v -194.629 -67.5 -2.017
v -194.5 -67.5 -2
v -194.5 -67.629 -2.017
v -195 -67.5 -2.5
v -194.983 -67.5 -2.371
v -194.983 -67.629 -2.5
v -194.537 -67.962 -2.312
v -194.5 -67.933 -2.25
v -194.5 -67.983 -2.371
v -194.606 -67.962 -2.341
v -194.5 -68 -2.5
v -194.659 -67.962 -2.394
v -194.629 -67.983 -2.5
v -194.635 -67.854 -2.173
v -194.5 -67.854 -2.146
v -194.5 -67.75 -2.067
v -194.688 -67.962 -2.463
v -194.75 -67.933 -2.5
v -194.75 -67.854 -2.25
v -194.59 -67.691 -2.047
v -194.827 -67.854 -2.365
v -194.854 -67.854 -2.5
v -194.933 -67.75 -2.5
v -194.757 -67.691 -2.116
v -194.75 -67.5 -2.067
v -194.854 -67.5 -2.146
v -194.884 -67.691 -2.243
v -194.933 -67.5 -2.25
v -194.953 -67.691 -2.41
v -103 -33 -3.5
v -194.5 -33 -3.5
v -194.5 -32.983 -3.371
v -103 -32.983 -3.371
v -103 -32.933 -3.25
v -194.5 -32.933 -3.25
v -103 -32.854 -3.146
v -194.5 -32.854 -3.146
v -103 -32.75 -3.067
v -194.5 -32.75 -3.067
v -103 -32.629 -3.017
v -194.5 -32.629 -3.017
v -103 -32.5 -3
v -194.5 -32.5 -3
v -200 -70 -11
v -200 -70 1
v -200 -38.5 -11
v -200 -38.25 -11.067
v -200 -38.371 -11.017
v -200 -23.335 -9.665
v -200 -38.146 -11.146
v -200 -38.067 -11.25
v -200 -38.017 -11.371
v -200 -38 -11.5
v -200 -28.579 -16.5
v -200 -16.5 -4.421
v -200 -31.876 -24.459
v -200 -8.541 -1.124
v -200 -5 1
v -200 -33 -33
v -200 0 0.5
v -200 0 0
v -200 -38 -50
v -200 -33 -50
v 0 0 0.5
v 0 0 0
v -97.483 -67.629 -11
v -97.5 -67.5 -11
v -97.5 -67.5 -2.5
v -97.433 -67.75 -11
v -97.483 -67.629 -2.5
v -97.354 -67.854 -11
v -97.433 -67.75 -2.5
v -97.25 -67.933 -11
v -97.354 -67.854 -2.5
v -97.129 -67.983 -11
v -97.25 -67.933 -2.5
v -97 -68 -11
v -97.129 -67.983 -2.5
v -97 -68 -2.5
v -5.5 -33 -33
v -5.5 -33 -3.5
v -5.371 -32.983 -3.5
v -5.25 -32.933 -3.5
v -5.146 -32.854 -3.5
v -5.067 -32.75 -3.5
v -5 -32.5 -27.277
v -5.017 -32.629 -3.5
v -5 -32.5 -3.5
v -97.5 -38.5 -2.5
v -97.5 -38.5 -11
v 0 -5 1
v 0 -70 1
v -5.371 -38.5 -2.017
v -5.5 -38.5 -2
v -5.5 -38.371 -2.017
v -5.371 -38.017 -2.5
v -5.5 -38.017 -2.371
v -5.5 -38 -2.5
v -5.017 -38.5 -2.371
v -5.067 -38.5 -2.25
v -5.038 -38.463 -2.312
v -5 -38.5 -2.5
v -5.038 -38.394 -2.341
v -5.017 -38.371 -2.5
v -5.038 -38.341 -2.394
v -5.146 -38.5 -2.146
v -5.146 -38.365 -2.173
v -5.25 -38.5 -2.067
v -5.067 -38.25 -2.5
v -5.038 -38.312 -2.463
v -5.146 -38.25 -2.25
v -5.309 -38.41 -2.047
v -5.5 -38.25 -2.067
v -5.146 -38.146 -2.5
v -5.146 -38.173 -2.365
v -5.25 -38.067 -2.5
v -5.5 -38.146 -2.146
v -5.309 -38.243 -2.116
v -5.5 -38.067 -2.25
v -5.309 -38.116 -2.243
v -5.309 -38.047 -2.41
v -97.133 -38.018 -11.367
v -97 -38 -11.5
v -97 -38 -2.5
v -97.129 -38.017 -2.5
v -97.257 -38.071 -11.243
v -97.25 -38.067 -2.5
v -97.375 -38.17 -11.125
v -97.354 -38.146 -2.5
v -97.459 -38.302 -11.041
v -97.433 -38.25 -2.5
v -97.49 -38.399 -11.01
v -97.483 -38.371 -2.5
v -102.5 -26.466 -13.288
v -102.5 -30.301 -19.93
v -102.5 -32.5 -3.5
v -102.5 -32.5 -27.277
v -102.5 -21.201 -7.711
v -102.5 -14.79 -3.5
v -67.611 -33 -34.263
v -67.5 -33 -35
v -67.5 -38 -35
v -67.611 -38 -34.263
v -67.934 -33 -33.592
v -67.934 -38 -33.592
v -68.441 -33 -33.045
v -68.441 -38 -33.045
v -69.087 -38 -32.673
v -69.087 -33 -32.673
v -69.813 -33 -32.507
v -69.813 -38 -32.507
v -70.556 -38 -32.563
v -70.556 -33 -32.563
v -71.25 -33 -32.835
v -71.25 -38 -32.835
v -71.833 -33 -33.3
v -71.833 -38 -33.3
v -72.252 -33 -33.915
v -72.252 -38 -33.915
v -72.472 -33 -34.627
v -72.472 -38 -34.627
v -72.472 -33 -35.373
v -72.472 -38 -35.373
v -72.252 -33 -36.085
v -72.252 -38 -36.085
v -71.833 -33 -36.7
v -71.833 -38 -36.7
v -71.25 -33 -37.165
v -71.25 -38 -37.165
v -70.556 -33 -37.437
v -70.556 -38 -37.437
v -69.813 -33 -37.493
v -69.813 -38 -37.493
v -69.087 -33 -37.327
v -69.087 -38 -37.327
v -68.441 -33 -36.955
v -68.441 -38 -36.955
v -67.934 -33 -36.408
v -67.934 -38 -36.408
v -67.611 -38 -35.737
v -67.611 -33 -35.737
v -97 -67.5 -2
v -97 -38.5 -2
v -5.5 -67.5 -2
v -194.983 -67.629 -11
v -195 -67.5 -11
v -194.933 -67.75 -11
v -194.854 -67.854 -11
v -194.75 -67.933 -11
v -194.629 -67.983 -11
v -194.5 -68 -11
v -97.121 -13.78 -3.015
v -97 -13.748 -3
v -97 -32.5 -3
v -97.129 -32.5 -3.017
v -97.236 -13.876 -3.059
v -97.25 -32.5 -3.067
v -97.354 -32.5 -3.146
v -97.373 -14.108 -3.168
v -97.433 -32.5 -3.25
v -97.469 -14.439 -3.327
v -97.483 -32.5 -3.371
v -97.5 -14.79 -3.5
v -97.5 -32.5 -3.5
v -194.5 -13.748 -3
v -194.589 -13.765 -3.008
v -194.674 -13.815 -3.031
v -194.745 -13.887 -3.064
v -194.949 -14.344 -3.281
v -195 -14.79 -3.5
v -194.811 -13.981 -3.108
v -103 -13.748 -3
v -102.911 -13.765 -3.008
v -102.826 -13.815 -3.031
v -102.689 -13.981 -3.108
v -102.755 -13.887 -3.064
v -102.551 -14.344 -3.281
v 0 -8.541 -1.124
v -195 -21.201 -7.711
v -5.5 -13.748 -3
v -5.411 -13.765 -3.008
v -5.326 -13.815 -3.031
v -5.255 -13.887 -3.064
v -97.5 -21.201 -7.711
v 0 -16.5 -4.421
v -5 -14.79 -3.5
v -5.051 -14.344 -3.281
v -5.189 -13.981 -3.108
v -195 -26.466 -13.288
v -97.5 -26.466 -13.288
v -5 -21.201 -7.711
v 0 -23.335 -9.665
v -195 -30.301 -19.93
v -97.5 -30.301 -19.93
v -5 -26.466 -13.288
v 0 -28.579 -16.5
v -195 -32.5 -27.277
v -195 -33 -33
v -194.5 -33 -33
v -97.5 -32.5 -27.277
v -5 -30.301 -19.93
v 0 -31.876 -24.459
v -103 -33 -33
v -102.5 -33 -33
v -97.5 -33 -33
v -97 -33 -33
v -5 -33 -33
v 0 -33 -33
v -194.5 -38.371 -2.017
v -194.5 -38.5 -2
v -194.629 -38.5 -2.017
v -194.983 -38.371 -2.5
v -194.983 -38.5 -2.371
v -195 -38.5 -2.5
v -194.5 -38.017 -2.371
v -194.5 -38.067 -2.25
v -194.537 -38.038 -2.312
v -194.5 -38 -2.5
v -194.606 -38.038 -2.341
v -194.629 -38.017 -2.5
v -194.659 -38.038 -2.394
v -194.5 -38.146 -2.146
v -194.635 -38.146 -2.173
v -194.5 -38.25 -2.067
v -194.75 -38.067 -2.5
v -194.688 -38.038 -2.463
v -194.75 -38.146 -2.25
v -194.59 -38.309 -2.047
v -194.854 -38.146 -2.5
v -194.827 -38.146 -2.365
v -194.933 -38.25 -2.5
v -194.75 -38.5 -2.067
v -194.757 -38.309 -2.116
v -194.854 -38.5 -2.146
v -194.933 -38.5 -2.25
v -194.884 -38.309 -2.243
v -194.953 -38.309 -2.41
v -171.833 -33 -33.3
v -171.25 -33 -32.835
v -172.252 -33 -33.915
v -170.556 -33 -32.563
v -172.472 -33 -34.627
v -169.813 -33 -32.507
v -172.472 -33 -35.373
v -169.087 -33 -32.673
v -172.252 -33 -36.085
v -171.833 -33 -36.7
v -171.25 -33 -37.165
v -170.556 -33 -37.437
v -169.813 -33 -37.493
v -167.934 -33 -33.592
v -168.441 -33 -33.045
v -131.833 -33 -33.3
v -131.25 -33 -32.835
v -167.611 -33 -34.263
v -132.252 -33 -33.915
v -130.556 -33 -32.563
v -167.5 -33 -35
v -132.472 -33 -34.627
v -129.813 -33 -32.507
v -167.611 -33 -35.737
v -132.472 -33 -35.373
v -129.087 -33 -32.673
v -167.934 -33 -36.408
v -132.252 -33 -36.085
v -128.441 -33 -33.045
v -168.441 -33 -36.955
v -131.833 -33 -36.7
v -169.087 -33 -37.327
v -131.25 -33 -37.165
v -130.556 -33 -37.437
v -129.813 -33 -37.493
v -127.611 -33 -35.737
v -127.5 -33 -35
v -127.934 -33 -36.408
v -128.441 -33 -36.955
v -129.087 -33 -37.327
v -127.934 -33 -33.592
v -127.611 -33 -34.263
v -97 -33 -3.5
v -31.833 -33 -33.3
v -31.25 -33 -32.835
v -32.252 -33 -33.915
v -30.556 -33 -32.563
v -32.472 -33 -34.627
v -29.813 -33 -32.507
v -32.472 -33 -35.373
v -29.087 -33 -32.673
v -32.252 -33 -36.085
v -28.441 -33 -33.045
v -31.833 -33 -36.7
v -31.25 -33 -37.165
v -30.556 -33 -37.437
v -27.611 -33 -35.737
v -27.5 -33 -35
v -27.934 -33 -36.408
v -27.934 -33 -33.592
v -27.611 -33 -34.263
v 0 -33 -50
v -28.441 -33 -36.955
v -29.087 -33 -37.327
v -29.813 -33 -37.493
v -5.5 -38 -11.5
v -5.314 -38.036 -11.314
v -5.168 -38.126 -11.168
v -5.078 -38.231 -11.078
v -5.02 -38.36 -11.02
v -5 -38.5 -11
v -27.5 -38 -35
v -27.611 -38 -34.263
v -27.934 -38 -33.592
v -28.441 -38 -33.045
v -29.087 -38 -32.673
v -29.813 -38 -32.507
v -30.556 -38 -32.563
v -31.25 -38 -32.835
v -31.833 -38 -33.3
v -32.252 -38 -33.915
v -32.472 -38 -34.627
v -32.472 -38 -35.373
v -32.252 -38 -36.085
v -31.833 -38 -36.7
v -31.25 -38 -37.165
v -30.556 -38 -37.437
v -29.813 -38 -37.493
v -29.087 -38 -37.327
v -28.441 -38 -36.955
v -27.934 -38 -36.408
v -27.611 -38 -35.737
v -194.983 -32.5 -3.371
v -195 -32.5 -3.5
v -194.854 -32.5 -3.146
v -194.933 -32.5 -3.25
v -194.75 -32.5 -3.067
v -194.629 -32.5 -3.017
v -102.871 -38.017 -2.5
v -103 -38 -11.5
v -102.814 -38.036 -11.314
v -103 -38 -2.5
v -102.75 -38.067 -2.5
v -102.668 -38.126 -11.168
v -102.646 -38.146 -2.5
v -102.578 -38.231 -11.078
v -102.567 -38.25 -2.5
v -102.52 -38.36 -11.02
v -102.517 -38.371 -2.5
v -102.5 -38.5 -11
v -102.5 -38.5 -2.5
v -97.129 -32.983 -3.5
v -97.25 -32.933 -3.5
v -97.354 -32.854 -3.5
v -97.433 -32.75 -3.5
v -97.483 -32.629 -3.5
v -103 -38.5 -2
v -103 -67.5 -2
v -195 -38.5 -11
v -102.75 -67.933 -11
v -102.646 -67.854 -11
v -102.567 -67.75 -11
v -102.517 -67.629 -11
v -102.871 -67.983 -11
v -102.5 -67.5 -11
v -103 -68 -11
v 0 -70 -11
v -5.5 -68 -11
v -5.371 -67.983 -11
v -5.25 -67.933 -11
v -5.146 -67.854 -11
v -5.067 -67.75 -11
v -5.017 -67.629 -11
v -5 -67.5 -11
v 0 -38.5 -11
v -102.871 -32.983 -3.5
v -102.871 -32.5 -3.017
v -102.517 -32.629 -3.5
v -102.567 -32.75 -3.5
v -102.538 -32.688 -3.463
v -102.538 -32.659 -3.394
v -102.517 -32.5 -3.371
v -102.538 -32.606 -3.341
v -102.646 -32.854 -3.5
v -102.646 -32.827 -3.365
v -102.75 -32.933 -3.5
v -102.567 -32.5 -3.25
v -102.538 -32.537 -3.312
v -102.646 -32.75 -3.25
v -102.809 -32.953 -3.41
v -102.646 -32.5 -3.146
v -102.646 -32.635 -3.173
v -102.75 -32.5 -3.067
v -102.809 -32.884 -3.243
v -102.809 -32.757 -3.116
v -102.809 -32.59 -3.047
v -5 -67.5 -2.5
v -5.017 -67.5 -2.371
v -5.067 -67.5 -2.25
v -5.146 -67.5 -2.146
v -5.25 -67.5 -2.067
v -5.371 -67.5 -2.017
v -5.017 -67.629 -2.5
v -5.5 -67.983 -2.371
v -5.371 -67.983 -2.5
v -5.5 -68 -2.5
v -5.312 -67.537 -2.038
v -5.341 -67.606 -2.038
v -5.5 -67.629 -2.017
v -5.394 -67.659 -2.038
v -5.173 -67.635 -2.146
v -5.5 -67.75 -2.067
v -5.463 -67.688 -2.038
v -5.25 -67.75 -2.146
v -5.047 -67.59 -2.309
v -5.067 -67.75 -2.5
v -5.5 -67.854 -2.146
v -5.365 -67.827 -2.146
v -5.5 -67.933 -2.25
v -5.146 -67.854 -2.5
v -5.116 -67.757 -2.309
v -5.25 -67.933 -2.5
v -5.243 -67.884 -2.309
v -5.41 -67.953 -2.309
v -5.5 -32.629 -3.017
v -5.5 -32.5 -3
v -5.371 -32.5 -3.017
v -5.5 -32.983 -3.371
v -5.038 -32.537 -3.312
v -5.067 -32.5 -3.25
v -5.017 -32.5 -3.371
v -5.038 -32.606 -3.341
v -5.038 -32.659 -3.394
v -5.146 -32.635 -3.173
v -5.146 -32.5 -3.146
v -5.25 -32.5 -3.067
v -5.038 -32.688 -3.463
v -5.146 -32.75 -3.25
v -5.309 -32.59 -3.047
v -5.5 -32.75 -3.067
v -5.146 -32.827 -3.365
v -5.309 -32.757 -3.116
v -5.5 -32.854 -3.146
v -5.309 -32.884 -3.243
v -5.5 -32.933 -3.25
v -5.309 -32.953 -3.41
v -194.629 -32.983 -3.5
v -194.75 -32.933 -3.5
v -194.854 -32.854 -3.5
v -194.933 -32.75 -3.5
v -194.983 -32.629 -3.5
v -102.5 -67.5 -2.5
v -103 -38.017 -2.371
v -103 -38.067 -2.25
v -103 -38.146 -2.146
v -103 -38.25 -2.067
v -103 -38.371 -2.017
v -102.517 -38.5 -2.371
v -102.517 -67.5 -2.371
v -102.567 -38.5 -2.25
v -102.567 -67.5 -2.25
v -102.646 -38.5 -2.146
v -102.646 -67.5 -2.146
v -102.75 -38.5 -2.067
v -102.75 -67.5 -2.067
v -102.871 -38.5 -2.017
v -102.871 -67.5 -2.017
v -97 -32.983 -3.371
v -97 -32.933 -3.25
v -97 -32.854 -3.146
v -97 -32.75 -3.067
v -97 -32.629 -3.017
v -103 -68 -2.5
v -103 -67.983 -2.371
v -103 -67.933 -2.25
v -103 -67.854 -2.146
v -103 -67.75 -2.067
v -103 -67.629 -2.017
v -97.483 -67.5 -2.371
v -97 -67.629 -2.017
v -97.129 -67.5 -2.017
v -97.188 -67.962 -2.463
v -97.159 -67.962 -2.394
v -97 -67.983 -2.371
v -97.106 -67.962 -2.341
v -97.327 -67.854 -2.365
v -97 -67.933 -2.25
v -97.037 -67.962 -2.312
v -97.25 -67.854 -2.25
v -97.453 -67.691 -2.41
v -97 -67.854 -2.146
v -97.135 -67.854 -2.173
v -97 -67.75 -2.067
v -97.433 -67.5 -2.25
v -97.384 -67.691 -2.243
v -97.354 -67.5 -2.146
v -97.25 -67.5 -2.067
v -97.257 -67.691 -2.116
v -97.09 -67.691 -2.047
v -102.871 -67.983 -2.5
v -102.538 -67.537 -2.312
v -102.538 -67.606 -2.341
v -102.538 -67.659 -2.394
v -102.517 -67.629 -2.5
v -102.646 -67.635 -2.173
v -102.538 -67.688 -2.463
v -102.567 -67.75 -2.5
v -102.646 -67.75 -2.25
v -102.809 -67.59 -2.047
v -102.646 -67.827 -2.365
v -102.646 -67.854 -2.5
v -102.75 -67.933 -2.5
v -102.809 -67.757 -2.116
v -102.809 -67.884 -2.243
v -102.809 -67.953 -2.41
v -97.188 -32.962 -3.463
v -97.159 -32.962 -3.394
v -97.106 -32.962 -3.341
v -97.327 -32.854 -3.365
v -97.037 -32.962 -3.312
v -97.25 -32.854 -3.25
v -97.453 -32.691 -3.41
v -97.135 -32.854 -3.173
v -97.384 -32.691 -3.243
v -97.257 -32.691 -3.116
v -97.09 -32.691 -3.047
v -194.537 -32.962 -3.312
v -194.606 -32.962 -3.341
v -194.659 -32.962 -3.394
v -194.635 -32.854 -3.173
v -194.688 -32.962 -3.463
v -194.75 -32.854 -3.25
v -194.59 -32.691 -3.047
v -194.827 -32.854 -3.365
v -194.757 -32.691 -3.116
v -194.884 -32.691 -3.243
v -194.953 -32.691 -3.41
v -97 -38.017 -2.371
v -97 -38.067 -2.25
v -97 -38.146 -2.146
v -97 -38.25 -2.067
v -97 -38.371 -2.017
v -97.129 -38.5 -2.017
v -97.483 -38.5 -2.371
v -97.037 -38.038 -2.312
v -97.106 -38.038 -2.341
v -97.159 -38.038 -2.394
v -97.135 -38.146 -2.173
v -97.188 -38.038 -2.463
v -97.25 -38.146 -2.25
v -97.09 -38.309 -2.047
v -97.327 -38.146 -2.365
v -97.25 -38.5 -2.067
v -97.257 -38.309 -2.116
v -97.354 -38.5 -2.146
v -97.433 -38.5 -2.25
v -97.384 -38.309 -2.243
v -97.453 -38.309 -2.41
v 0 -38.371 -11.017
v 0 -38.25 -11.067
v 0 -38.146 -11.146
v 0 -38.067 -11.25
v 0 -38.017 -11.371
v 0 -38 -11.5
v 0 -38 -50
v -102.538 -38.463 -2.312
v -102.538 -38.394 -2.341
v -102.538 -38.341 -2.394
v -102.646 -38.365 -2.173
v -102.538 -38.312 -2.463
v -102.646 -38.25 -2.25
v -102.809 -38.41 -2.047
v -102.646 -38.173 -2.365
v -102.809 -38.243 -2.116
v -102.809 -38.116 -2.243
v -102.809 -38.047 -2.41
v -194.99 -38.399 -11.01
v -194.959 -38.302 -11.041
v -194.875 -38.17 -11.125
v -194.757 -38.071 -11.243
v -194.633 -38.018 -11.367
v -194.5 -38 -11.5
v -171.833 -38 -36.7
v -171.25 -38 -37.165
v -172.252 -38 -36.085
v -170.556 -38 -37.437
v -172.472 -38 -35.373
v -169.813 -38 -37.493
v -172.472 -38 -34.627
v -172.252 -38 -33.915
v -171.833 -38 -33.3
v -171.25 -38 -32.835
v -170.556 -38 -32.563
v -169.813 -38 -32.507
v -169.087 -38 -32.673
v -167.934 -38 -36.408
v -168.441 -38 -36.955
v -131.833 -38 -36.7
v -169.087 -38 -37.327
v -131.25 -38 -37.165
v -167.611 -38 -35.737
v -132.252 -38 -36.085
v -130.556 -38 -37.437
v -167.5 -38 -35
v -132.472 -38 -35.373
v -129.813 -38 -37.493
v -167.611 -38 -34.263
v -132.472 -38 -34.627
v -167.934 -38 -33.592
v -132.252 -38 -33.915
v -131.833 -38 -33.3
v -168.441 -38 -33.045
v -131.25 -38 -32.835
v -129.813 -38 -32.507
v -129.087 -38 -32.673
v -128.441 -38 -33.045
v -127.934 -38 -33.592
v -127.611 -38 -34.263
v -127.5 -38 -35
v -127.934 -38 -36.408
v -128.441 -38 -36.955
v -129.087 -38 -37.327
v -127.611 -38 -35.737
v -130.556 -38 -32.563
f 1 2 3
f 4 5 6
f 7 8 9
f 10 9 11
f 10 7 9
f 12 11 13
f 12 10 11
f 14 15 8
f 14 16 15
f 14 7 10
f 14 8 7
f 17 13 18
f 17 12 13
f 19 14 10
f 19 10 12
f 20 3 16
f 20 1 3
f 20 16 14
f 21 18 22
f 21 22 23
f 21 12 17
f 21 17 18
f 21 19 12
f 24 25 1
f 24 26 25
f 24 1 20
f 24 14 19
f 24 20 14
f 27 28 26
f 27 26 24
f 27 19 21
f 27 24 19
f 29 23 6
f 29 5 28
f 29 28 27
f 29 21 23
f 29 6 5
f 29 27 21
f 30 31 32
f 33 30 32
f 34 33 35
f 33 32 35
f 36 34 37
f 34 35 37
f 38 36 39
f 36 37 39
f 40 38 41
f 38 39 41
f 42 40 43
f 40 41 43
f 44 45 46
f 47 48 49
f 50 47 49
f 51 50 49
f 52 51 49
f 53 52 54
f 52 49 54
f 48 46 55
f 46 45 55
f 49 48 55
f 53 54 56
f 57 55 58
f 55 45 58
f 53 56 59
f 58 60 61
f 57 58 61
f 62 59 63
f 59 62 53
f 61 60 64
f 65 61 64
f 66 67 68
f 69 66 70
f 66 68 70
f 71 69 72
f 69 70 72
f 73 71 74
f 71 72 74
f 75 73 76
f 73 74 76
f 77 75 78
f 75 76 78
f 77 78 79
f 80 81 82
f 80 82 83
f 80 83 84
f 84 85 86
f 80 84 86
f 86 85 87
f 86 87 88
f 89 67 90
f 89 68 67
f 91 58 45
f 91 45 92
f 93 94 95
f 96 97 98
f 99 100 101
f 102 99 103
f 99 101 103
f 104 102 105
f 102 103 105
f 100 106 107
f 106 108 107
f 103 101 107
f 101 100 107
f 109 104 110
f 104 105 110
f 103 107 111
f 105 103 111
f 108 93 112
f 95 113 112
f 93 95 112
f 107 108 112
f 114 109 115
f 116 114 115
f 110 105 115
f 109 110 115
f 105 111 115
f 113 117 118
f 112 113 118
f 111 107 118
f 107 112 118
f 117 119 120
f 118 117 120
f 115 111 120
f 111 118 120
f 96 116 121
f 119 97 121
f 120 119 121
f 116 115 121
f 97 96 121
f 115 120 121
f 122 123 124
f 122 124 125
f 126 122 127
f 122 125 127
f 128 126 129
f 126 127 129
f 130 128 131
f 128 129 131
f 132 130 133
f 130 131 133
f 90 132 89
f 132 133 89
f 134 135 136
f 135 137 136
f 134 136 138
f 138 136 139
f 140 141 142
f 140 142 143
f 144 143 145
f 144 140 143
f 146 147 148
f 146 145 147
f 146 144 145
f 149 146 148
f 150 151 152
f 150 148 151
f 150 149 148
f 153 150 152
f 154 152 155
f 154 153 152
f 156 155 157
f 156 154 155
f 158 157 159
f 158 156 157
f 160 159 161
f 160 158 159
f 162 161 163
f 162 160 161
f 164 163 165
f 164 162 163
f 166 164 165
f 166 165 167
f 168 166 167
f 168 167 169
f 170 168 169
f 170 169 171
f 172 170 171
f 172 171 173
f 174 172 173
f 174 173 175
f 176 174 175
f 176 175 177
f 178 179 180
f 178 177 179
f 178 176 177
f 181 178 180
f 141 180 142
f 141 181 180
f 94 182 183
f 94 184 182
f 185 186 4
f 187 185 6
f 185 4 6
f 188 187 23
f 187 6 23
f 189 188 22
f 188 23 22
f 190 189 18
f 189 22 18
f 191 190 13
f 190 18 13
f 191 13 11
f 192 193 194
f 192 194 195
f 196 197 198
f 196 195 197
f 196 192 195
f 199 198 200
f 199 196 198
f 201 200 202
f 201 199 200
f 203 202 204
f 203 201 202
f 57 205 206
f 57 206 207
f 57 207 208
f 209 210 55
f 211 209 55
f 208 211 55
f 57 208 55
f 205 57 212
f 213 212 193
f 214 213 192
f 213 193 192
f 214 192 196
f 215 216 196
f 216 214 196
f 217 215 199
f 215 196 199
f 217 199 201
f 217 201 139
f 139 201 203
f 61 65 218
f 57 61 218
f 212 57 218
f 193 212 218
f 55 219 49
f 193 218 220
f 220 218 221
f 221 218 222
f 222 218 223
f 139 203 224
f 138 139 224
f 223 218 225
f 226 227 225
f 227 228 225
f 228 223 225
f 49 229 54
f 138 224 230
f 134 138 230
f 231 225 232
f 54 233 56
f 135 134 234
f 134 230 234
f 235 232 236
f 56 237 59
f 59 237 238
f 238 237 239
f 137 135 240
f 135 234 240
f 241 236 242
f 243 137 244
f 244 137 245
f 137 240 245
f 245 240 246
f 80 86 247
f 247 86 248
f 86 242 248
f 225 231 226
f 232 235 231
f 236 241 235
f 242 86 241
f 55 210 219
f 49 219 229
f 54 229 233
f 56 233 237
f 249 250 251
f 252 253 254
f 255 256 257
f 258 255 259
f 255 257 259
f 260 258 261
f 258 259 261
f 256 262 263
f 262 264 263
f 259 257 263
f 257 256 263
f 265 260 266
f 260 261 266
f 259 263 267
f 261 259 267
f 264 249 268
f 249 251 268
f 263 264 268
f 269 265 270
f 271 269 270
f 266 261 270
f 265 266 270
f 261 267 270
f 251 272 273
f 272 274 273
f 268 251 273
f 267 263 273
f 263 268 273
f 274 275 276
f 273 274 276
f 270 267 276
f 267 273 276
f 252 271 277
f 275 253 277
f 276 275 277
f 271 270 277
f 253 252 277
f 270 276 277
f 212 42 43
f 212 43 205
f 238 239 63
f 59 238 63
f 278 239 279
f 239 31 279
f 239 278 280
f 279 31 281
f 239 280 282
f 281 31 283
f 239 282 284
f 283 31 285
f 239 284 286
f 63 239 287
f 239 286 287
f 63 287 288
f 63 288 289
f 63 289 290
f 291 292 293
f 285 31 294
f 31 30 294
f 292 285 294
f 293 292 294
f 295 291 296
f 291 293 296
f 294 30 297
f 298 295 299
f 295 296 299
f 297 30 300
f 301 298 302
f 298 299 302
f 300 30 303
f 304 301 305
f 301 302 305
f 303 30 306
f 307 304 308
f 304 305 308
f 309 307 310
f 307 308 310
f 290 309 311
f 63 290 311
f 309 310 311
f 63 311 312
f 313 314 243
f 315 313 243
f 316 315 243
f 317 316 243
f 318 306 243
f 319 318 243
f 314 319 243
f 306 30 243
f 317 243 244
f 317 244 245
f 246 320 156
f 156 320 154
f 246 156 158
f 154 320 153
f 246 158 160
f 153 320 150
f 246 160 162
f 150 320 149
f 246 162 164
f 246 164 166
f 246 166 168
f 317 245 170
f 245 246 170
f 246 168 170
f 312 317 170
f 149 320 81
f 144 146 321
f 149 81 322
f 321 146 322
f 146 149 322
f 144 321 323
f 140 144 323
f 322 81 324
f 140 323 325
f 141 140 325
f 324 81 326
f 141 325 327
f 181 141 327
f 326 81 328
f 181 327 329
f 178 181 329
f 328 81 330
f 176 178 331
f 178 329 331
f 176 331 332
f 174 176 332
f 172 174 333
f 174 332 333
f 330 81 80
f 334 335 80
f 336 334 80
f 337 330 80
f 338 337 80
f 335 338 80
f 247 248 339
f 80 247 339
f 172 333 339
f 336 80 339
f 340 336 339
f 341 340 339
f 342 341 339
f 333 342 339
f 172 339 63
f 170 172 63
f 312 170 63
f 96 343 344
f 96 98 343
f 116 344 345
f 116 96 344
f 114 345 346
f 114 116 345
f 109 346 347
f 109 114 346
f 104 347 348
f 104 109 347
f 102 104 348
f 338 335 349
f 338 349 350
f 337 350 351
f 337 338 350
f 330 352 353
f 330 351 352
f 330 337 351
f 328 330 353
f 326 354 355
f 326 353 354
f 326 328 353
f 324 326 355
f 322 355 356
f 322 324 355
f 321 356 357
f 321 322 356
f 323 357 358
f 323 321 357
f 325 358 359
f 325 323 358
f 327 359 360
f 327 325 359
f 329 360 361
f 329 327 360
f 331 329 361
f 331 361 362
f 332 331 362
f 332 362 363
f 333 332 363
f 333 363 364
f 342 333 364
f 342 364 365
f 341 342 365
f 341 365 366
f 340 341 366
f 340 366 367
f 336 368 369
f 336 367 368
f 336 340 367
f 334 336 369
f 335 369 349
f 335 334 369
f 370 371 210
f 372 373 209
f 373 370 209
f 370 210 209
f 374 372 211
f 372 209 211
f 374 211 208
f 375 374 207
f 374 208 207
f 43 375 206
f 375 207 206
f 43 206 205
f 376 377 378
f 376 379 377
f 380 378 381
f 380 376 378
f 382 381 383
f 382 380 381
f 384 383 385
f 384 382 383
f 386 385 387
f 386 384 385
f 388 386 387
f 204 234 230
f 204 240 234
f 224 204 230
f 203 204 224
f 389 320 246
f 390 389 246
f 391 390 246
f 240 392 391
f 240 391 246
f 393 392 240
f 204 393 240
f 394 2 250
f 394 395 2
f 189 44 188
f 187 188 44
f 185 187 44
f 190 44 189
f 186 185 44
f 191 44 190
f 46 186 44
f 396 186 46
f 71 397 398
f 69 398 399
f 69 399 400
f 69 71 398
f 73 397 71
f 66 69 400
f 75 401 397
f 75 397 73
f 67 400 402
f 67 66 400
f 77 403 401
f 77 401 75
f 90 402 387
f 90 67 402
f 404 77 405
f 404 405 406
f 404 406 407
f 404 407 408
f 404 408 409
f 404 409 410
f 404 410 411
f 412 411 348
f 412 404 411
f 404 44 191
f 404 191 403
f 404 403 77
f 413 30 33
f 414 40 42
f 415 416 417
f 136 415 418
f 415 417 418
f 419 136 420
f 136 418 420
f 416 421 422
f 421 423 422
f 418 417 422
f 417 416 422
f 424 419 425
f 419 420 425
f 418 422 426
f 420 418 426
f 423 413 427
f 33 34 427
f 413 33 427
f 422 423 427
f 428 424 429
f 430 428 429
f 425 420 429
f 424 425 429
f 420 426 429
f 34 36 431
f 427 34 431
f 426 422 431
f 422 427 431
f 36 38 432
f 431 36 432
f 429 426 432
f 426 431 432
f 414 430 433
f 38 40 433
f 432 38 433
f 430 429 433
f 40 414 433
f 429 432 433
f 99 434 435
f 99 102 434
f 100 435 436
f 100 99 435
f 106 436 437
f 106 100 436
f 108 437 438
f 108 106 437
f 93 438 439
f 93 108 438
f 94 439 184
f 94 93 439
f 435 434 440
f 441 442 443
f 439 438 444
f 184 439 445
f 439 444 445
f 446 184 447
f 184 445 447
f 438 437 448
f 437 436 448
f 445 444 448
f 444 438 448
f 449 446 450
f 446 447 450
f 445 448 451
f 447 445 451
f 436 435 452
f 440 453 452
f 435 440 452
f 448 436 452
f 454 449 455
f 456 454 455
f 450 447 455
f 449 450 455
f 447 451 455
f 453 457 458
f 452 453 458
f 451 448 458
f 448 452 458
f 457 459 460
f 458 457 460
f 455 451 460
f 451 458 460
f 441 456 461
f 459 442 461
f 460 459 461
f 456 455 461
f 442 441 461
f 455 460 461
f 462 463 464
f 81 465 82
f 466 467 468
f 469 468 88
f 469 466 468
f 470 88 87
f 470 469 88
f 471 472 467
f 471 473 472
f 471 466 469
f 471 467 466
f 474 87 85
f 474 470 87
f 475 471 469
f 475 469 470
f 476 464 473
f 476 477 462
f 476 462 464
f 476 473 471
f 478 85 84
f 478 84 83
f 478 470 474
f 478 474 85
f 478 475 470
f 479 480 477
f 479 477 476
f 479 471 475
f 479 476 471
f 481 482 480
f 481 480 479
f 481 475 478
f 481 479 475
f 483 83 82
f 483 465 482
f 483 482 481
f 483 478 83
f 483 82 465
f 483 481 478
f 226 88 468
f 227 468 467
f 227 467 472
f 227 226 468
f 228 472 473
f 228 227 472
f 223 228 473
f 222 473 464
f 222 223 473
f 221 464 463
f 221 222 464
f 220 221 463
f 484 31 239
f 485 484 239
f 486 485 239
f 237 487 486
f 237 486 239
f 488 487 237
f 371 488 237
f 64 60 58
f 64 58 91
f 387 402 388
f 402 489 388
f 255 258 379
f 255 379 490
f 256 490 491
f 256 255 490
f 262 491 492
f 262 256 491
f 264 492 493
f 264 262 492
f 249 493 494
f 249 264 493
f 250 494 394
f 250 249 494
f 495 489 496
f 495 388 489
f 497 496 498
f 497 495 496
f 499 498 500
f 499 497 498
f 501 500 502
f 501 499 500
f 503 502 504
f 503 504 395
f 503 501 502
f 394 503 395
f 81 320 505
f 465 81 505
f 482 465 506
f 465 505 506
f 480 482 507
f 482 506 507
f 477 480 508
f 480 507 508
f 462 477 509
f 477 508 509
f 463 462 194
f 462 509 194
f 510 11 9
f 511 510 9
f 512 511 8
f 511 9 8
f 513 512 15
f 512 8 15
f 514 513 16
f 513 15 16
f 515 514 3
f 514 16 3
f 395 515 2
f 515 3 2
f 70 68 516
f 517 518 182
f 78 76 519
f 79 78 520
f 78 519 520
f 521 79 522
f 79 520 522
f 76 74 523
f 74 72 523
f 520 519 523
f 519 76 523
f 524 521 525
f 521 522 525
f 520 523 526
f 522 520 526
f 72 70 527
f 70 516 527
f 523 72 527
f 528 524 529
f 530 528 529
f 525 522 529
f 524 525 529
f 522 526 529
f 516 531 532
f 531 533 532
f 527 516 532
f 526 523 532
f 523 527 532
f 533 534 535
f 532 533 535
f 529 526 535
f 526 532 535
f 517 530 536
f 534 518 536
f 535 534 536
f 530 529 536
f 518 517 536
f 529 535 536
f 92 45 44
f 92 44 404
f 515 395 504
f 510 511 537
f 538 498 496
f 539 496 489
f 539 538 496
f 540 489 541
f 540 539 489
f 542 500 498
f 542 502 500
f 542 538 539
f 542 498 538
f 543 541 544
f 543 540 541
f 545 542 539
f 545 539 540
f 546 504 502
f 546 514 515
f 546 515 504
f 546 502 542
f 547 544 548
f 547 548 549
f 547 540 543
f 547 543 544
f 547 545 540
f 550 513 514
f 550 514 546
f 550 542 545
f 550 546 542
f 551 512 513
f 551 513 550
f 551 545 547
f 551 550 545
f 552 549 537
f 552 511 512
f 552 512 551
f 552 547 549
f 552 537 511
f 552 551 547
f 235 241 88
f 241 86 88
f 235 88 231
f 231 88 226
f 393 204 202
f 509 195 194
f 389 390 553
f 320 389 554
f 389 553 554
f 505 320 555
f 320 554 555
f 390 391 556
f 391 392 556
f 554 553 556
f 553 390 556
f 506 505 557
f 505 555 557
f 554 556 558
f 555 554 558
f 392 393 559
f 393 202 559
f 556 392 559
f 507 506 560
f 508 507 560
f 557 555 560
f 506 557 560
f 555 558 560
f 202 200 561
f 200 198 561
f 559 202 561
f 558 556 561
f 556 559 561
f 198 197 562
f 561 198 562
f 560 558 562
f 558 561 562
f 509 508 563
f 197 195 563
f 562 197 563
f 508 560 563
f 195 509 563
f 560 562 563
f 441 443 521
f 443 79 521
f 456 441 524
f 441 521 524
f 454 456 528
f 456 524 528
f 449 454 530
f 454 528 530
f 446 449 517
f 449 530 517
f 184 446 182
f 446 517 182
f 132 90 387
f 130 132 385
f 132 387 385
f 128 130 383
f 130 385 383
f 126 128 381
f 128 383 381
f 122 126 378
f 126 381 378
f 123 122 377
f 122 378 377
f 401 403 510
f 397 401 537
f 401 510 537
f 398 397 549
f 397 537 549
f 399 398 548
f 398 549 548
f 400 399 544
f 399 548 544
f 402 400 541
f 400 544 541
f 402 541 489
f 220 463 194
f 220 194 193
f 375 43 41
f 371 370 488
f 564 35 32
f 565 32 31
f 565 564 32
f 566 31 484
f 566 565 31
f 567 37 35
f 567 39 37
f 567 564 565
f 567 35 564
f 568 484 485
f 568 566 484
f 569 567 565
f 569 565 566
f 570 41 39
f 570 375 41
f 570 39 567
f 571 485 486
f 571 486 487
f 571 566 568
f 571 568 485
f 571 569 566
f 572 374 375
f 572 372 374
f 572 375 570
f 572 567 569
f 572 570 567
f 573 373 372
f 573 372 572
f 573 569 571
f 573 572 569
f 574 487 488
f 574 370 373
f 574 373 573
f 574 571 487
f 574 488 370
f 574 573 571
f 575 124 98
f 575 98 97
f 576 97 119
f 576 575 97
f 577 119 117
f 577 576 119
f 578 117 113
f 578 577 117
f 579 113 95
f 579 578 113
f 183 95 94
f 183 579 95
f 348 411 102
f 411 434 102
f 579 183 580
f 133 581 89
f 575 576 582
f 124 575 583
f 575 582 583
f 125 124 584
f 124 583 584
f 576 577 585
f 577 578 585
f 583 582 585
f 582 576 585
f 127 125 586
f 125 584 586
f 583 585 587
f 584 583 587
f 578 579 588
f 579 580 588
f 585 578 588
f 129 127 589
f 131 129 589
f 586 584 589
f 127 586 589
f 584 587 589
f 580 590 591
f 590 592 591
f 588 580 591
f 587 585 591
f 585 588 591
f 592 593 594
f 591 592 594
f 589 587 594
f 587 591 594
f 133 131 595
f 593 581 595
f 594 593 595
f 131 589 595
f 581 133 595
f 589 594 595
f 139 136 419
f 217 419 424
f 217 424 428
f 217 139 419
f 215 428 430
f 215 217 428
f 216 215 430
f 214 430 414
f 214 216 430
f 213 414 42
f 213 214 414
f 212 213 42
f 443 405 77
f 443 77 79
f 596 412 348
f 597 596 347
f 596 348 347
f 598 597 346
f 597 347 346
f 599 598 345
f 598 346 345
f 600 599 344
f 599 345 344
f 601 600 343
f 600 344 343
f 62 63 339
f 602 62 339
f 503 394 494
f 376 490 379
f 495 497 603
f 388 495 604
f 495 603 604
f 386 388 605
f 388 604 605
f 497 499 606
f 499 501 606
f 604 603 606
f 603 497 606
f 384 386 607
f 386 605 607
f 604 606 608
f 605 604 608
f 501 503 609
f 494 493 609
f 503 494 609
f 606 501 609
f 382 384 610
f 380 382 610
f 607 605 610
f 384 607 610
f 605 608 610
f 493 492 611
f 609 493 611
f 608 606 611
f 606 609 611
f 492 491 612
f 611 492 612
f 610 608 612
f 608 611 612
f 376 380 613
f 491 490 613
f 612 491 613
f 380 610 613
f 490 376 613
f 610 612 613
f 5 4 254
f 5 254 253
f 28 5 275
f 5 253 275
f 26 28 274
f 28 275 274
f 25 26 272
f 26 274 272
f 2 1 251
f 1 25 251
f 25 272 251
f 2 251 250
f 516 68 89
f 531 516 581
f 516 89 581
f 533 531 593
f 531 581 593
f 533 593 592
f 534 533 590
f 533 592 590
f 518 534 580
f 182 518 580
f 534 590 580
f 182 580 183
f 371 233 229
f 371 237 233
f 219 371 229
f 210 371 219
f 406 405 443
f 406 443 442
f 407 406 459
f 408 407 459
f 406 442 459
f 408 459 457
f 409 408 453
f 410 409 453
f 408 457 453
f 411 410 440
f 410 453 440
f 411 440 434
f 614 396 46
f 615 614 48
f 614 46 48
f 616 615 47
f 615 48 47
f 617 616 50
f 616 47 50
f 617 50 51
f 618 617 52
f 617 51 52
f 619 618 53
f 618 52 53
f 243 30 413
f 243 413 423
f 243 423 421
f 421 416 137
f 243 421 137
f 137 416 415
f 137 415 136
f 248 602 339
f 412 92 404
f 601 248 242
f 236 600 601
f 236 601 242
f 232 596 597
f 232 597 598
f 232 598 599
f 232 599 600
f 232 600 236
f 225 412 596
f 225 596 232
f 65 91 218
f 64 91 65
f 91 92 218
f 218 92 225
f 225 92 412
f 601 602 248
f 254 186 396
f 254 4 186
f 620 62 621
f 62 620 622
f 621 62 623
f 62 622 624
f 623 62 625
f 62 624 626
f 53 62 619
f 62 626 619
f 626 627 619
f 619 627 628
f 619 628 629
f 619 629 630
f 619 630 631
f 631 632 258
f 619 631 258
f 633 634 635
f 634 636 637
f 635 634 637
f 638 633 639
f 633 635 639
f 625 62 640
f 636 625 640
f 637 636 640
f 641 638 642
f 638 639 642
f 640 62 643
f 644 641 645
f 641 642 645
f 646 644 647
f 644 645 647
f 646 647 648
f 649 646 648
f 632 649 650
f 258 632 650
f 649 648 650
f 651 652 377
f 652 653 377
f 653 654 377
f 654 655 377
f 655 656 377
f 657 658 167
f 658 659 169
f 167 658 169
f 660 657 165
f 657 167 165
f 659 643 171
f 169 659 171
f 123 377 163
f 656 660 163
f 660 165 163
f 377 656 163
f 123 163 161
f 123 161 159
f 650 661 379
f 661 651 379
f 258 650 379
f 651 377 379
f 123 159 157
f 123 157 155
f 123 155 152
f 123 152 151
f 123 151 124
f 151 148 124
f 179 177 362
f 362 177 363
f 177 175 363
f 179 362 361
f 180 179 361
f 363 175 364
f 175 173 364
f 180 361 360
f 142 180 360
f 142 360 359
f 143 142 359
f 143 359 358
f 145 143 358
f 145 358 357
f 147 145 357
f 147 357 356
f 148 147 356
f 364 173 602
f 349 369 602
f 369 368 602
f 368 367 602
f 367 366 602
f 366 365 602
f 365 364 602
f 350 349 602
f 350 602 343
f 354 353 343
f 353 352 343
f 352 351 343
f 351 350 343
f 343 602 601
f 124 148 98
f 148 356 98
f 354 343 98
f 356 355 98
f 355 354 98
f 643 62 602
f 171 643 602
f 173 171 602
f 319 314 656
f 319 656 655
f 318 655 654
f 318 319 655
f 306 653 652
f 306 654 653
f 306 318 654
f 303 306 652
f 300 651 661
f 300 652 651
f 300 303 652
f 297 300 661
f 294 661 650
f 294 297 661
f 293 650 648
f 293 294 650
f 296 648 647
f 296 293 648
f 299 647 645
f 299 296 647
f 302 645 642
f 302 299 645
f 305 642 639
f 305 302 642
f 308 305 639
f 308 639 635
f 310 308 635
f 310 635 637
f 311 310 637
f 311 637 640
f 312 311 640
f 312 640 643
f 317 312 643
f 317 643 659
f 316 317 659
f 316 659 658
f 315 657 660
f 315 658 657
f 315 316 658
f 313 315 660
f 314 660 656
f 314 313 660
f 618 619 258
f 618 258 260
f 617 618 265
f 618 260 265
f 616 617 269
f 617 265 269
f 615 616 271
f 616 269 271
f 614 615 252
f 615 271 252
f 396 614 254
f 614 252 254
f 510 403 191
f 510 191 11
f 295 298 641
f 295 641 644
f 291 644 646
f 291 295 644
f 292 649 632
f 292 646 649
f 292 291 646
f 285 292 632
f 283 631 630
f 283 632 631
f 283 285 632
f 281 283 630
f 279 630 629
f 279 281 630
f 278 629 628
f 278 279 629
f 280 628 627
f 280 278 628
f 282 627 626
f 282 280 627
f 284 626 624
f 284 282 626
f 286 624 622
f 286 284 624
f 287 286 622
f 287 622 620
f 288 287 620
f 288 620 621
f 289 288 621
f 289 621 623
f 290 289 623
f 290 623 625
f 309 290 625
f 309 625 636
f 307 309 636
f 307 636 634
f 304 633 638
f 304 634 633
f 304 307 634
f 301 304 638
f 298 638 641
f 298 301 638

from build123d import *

# Parameters (mm, degrees)
F0_W      = 200
F0_H      = 50
F0_H_2    = 1
F1_DEPTH  = 70
F2_W      = 32
F2_H      = 39
F3_DEPTH  = 200
F5_DEPTH  = 200
F6_W      = 30
F6_H      = 9
F7_DEPTH  = 195
F8_DEPTH  = 5
F9_START  = -97.5
F9_DEPTH  = 5
F11_START = -5
F10_W     = 28.059584938
F10_H     = 30
F11_DEPTH = 92.5
F12_START = -102.5
F12_DEPTH = 92.5
F13_R     = 2.5
F14_DEPTH = 60
F15_R     = 0.5
F16_SIZE2 = 0.5
F16_SIZE  = 5


with BuildPart() as f1:
    # F0 (on Front) → F1 (new body)
    with BuildSketch(Plane.XZ):
        with Locations((-100, -25)):
            Rectangle(F0_W, F0_H)
        with Locations((-100, 0.5)):
            Rectangle(F0_W, F0_H_2)
    extrude(amount=F1_DEPTH)

    # F2 (on Right) → F3 (cut)
    with BuildSketch(Plane.YZ):
        with Locations((-54, -30.5)):
            Rectangle(F2_W, F2_H)
    extrude(amount=-F3_DEPTH, mode=Mode.SUBTRACT)

    # F4 (on Right) → F5 (cut)
    with BuildSketch(Plane.YZ):
        with BuildLine():
            Line((0, -50), (0, 0))
            ThreePointArc((0, 0), (-23.3345237792, -9.6654762208), (-33, -33))
            Line((-33, -33), (-33, -50))
            Line((-33, -50), (0, -50))
        make_face()
    extrude(amount=-F5_DEPTH, mode=Mode.SUBTRACT)

    # F6 (on Right) → F7 (cut)
    with BuildSketch(Plane.YZ):
        with Locations((-53, -6.5)):
            Rectangle(F6_W, F6_H)
    extrude(amount=-F7_DEPTH, mode=Mode.SUBTRACT)

    # F6 (on Right) → F8 (join)
    with BuildSketch(Plane.YZ):
        with Locations((-53, -6.5)):
            Rectangle(F6_W, F6_H)
    extrude(amount=-F8_DEPTH)

    # F6 (on Right) → F9 (join)
    with BuildSketch(Plane.YZ.offset(F9_START)):
        with Locations((-53, -6.5)):
            Rectangle(F6_W, F6_H)
    extrude(amount=-F9_DEPTH)

    # F10 (on Right) → F11 (cut)
    with BuildSketch(Plane.YZ.offset(F11_START)):
        with Locations((-18.970207531, -18)):
            Rectangle(F10_W, F10_H)
    extrude(amount=-F11_DEPTH, mode=Mode.SUBTRACT)

    # F10 (on Right) → F12 (cut)
    with BuildSketch(Plane.YZ.offset(F12_START)):
        with Locations((-18.970207531, -18)):
            Rectangle(F10_W, F10_H)
    extrude(amount=-F12_DEPTH, mode=Mode.SUBTRACT)

    # F13 (on Front) → F14 (cut)
    with BuildSketch(Plane.XZ):
        with Locations((-30, -35)):
            Circle(F13_R)
        with Locations((-70, -35)):
            Circle(F13_R)
        with Locations((-130, -35)):
            Circle(F13_R)
        with Locations((-170, -35)):
            Circle(F13_R)
    extrude(amount=F14_DEPTH, mode=Mode.SUBTRACT)

    # F15
    f15_edges = [f1.edges().sort_by_distance(p)[0] for p in [
        (-195, -23.373864, -3),
        (-148.75, -33, -3),
        (-195, -33, -18),
        (-97.5, -23.373864, -3),
        (-97.5, -33, -18),
        (-51.25, -33, -3),
        (-102.5, -33, -18),
        (-102.5, -23.373864, -3),
        (-5, -23.373864, -3),
        (-5, -33, -18),
        (-97.5, -53, -2),
        (-51.25, -38, -2),
        (-195, -53, -2),
        (-148.75, -38, -2),
        (-148.75, -68, -2),
        (-102.5, -53, -2),
        (-102.5, -68, -6.5),
        (-195, -68, -6.5),
        (-97.5, -68, -6.5),
        (-5, -68, -6.5),
        (-5, -53, -2),
        (-51.25, -68, -2),
        (-5, -38, -6.5),
        (-2.5, -38, -11),
        (-102.5, -38, -6.5),
        (-100, -38, -11),
        (-197.5, -38, -11),
        (-195, -38, -6.5),
        (-97.5, -38, -6.5),
    ]]
    fillet(f15_edges, radius=F15_R)

    # F16
    f16_edges = [f1.edges().sort_by_distance(p)[0] for p in [
        (-100, 0, 1),
    ]]
    f16_side = f1.faces().sort_by_distance((-100, -35, 1))[0]
    chamfer(f16_edges, length=F16_SIZE, length2=F16_SIZE2, reference=f16_side)


solid = f1.part
